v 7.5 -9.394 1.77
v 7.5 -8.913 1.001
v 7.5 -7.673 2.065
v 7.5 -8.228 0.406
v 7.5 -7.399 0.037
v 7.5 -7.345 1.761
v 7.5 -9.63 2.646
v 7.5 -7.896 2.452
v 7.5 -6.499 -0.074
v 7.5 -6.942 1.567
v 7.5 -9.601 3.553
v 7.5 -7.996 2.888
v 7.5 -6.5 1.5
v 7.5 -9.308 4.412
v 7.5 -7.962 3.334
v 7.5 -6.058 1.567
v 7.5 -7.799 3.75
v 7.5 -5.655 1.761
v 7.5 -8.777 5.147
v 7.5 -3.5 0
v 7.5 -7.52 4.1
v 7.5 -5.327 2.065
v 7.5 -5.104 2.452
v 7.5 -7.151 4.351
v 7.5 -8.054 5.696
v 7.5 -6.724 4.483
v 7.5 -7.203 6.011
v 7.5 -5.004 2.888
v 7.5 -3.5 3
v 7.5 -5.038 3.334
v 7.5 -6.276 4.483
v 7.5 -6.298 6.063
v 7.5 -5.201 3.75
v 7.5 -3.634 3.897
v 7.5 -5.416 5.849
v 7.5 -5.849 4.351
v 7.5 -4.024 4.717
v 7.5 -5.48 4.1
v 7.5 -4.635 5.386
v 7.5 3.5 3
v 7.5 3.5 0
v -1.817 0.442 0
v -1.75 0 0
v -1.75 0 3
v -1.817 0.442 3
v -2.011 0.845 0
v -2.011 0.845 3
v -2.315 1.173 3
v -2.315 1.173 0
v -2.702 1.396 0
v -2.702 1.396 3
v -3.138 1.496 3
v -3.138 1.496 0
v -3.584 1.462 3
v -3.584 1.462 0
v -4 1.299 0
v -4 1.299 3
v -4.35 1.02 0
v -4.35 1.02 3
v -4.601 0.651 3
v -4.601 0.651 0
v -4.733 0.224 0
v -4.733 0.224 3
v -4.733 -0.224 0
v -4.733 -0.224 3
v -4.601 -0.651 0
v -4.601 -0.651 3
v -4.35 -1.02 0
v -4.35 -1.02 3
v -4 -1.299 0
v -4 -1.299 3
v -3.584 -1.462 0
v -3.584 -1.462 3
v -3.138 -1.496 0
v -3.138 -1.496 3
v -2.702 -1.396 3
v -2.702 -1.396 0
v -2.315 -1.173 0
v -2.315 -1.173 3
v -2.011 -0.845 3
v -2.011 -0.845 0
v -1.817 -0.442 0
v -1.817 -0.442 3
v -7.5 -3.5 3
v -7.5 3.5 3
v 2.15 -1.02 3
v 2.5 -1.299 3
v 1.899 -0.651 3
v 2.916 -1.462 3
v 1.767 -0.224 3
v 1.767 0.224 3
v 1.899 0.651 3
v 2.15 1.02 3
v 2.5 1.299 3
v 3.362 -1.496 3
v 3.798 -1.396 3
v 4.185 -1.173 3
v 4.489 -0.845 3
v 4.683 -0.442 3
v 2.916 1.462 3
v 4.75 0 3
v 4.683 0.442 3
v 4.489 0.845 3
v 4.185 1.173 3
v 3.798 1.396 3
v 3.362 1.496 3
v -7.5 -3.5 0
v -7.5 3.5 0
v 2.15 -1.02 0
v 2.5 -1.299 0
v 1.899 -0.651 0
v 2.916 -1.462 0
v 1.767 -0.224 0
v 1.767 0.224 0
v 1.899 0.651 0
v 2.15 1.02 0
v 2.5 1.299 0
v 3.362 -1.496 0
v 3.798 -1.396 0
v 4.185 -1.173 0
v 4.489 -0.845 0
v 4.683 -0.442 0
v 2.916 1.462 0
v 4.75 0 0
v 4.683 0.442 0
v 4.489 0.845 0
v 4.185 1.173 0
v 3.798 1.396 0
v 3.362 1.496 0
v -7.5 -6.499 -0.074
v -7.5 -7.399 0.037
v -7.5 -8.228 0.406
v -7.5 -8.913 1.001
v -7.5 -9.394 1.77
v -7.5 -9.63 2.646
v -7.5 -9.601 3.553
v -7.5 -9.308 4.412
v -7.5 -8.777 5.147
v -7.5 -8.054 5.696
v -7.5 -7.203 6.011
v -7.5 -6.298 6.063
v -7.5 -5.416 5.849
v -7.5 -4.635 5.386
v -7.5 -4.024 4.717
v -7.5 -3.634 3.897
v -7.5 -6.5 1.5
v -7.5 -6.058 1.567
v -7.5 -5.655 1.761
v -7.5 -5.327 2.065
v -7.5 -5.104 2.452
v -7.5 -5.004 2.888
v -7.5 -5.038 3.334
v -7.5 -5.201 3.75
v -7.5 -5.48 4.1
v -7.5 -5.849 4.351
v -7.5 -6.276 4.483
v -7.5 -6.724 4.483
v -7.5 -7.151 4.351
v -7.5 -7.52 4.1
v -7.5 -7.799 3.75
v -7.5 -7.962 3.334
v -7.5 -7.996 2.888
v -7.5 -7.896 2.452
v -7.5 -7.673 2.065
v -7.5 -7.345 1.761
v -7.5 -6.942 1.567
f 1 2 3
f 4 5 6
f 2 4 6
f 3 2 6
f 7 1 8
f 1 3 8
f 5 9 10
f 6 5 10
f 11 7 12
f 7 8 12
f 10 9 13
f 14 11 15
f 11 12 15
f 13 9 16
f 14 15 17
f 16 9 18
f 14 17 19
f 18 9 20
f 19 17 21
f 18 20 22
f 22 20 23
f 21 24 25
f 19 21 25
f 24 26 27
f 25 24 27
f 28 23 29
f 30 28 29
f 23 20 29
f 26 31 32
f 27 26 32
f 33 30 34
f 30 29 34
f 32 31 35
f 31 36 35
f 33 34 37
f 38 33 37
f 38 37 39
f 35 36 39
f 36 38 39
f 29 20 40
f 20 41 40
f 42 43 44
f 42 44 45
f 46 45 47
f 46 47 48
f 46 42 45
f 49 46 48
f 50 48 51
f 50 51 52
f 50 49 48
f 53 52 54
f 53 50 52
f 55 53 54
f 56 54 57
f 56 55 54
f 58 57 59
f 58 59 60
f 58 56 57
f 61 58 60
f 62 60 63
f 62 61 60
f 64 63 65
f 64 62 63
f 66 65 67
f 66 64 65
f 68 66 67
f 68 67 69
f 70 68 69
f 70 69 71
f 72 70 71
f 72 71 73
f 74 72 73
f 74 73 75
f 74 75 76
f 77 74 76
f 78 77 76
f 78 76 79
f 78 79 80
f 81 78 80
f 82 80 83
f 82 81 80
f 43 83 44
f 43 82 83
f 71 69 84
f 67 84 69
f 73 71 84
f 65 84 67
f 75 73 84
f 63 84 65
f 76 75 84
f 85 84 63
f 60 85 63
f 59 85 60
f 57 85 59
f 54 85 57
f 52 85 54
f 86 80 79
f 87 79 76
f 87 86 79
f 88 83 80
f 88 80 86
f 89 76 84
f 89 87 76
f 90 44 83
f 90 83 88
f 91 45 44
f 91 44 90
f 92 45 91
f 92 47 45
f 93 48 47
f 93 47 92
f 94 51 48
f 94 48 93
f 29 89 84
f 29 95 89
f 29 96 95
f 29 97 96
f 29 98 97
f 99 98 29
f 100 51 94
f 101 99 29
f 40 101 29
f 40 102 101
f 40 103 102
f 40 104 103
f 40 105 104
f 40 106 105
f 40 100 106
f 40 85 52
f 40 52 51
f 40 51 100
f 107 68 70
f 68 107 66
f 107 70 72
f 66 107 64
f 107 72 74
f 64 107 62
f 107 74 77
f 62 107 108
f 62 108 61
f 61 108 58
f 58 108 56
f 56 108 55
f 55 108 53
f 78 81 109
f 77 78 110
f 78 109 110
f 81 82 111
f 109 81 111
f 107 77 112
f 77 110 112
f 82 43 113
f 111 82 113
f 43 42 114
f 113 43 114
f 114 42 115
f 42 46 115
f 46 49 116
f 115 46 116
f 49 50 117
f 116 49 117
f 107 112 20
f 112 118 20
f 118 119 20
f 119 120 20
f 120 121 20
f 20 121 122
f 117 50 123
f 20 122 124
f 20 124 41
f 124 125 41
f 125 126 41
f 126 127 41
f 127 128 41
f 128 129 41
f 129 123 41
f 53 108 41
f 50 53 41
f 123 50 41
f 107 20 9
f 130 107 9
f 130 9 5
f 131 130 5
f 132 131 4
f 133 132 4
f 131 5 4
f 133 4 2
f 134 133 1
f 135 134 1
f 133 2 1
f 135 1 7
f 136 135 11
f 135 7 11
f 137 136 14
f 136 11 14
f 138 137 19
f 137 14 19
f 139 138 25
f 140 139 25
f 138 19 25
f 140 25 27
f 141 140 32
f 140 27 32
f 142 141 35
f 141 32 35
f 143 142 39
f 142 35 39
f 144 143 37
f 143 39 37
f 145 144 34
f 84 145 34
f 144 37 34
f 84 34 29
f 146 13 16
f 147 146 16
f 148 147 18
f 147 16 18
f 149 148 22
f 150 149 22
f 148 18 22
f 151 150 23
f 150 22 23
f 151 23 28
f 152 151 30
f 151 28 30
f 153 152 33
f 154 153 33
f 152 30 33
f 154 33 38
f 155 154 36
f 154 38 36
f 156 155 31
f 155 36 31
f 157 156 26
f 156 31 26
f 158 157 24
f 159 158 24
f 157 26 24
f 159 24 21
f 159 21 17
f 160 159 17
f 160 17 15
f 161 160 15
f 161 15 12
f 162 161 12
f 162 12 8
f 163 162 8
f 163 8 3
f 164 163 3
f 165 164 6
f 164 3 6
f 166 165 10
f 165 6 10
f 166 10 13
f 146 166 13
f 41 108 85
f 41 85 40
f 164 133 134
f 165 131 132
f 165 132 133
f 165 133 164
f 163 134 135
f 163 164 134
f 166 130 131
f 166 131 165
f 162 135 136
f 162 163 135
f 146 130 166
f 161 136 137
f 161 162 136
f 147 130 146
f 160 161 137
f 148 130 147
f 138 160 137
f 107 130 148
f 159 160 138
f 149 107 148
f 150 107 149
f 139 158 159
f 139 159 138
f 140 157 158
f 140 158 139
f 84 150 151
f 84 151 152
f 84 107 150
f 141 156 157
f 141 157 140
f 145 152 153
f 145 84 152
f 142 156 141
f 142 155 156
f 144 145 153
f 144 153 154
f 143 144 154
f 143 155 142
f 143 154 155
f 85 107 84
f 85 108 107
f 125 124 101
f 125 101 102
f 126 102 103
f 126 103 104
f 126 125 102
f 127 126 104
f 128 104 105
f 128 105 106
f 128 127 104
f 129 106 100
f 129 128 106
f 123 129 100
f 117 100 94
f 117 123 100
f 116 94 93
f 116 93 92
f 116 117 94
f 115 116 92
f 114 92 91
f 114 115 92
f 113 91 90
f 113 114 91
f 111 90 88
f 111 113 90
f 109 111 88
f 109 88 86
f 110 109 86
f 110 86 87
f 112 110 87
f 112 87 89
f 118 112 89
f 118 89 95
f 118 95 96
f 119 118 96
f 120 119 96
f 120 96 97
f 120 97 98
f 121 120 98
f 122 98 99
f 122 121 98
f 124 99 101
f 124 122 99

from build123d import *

# Parameters (mm, degrees)
SZKIC1_W                    = 15
SZKIC1_H                    = 7
SZKIC1_R                    = 1.5
DODANIE_WYCI_GNI_CIE2_DEPTH = 3
SZKIC2_R                    = 1.5
DODANIE_WYCI_GNI_CIE3_DEPTH = 15


with BuildPart() as part:
    # Szkic1 → Dodanie-wyciągnięcie2 (new body)
    with BuildSketch(Plane.XY):
        Rectangle(SZKIC1_W, SZKIC1_H)
        with Locations((-3.25, 0)):
            Circle(SZKIC1_R, mode=Mode.SUBTRACT)
        with Locations((3.25, 0)):
            Circle(SZKIC1_R, mode=Mode.SUBTRACT)
    extrude(amount=DODANIE_WYCI_GNI_CIE2_DEPTH)

    # Szkic2 → Dodanie-wyciągnięcie3 (add)
    with BuildSketch(Plane(origin=(7.5, 0, 0), x_dir=(0, 0, -1), z_dir=(1, 0, 0))):
        with BuildLine():
            Line((0, -3.5), (0.074433096, -6.499076619))
            ThreePointArc((0.074433096, -6.499076619), (-5.147475229, -8.776813713), (-3, -3.5))
            Line((-3, -3.5), (0, -3.5))
        make_face()
        with Locations((-3, -6.5)):
            Circle(SZKIC2_R, mode=Mode.SUBTRACT)
    extrude(amount=-DODANIE_WYCI_GNI_CIE3_DEPTH)


solid = part.part
